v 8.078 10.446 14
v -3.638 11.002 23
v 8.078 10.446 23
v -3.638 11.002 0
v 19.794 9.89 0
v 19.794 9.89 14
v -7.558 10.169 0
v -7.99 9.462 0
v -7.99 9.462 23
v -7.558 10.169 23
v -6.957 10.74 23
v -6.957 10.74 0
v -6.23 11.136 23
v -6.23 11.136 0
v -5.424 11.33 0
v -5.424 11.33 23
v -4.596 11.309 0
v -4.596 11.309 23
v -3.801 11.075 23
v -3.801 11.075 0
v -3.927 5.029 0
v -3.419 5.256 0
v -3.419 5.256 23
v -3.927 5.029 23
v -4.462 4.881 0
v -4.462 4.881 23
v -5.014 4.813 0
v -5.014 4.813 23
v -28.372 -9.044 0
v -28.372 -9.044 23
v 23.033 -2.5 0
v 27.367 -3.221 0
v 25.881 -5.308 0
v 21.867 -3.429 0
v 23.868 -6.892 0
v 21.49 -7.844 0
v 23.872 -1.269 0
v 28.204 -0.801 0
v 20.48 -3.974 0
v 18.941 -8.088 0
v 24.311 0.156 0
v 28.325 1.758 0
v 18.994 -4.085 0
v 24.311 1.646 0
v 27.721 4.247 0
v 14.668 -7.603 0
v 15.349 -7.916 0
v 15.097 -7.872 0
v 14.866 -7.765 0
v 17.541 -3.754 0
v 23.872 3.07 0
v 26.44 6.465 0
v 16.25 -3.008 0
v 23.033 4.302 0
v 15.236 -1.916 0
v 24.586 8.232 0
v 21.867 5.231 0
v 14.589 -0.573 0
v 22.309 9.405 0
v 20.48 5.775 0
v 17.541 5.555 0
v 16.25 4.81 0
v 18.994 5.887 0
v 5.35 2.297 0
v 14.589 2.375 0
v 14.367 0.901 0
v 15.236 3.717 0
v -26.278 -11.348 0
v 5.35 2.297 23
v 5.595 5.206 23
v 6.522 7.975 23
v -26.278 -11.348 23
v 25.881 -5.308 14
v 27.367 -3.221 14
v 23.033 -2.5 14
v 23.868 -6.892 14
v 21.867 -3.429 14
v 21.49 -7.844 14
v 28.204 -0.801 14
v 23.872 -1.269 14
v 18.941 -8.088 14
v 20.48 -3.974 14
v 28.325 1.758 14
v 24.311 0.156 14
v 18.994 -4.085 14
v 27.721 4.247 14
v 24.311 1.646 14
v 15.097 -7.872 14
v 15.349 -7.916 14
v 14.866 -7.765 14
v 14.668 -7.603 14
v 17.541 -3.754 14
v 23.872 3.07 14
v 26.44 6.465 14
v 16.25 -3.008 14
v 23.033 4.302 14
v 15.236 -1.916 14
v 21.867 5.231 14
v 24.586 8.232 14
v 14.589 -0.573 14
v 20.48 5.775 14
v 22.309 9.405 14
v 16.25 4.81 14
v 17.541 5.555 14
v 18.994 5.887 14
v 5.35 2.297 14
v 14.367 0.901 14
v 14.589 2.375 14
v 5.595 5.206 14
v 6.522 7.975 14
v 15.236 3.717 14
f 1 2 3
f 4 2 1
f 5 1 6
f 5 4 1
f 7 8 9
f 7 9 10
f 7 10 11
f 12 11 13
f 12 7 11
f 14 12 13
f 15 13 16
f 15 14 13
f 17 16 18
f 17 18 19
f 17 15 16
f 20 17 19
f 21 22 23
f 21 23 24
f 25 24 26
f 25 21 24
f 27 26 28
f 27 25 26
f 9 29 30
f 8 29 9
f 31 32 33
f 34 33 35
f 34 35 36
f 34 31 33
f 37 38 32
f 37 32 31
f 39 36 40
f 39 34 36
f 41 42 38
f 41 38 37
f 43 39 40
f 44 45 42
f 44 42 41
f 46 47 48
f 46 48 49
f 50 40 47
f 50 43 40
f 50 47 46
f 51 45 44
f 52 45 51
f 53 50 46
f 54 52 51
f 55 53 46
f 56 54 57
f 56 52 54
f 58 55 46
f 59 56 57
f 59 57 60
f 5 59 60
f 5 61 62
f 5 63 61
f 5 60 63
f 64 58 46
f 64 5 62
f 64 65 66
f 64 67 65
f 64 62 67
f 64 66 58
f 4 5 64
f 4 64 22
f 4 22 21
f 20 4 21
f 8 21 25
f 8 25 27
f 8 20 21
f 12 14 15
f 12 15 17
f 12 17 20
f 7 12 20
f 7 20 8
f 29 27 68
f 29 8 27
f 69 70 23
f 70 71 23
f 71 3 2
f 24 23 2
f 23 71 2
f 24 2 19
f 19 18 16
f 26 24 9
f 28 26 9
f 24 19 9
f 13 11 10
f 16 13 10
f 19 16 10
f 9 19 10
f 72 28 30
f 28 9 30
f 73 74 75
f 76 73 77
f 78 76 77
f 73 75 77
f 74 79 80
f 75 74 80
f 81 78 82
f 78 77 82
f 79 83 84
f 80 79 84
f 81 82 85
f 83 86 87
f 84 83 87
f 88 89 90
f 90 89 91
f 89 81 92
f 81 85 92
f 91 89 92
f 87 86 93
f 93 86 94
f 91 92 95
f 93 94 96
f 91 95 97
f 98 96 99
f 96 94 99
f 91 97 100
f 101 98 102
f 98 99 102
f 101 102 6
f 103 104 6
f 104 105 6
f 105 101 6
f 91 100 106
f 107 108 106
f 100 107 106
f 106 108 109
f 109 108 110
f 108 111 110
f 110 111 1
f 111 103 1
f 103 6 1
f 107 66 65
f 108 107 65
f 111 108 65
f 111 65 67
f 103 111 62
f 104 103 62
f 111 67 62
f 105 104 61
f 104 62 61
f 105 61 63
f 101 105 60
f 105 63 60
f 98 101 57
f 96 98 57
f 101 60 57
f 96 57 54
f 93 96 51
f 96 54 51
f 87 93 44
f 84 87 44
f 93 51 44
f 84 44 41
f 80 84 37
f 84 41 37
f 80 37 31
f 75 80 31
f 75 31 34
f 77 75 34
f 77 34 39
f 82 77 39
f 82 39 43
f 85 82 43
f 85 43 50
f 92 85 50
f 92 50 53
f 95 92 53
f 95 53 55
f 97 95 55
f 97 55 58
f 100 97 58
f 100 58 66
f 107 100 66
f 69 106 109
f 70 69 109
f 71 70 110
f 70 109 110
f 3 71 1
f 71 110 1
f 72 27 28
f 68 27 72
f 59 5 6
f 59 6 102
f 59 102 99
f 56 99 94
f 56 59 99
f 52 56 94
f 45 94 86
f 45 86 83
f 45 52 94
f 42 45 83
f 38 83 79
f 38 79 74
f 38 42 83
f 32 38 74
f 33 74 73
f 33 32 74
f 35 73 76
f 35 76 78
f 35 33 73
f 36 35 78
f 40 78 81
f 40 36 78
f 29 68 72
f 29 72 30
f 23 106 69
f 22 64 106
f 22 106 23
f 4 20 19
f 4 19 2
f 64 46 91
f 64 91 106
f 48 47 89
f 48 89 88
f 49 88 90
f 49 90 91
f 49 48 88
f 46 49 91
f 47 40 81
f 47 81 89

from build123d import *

# Parameters (mm, degrees)
BOSS_EXTRUDE1_DEPTH = 23
SKETCH4_R           = 5
CUT_EXTRUDE3_DEPTH  = 28
CUT_EXTRUDE6_START  = -9
CUT_EXTRUDE6_DEPTH  = 9


with BuildPart() as part:
    # Sketch1 → Boss-Extrude1 (new body)
    with BuildSketch(Plane.XY):
        with BuildLine():
            Line((-26.278110913, -11.347842937), (-28.372166089, -9.043842083))
            Line((-28.372166089, -9.043842083), (-7.990208081, 9.462215656))
            ThreePointArc((-7.990208081, 9.462215656), (-6.229501786, 11.136017118), (-3.800938061, 11.07456612))
            Line((-3.800938061, 11.07456612), (-3.637536714, 11.001987755))
            Line((-3.637536714, 11.001987755), (19.793985679, 9.88969345))
            ThreePointArc((19.793985679, 9.88969345), (28.356197765, 0.474073738), (18.940578052, -8.088138348))
            Line((18.940578052, -8.088138348), (15.348738563, -7.91649311))
            ThreePointArc((15.348738563, -7.91649311), (14.978028358, -7.825889172), (14.668239185, -7.603030926))
            Line((14.668239185, -7.603030926), (5.35012395, 2.296550983))
            Line((5.35012395, 2.296550983), (-3.419163159, 5.255947346))
            ThreePointArc((-3.419163159, 5.255947346), (-4.191805611, 4.94513719), (-5.014133862, 4.813396687))
            Line((-5.014133862, 4.813396687), (-26.278110913, -11.347842937))
        make_face()
    extrude(amount=BOSS_EXTRUDE1_DEPTH)

    # Sketch4 → Cut-Extrude3 (cut)
    with BuildSketch(Plane(origin=(0, 0, 0), x_dir=(-1, 0, 0), z_dir=(0, 0, -1))):
        with Locations((-19.367281866, 0.900777551)):
            Circle(SKETCH4_R)
    extrude(amount=-CUT_EXTRUDE3_DEPTH, mode=Mode.SUBTRACT)

    # Sketch5 → Cut-Extrude6 (cut)
    with BuildSketch(Plane.XY.offset(23).offset(CUT_EXTRUDE6_START)):
        with BuildLine():
            Line((8.078224483, 10.445840603), (19.793985679, 9.88969345))
            ThreePointArc((19.793985679, 9.88969345), (28.356197765, 0.474073738), (18.940578052, -8.088138348))
            Line((18.940578052, -8.088138348), (15.348738563, -7.91649311))
            ThreePointArc((15.348738563, -7.91649311), (14.978028358, -7.825889172), (14.668239185, -7.603030926))
            Line((14.668239185, -7.603030926), (5.35012395, 2.296550983))
            ThreePointArc((5.35012395, 2.296550983), (5.975547098, 6.618462626), (8.078224483, 10.445840603))
        make_face()
    extrude(amount=CUT_EXTRUDE6_DEPTH, mode=Mode.SUBTRACT)


solid = part.part
